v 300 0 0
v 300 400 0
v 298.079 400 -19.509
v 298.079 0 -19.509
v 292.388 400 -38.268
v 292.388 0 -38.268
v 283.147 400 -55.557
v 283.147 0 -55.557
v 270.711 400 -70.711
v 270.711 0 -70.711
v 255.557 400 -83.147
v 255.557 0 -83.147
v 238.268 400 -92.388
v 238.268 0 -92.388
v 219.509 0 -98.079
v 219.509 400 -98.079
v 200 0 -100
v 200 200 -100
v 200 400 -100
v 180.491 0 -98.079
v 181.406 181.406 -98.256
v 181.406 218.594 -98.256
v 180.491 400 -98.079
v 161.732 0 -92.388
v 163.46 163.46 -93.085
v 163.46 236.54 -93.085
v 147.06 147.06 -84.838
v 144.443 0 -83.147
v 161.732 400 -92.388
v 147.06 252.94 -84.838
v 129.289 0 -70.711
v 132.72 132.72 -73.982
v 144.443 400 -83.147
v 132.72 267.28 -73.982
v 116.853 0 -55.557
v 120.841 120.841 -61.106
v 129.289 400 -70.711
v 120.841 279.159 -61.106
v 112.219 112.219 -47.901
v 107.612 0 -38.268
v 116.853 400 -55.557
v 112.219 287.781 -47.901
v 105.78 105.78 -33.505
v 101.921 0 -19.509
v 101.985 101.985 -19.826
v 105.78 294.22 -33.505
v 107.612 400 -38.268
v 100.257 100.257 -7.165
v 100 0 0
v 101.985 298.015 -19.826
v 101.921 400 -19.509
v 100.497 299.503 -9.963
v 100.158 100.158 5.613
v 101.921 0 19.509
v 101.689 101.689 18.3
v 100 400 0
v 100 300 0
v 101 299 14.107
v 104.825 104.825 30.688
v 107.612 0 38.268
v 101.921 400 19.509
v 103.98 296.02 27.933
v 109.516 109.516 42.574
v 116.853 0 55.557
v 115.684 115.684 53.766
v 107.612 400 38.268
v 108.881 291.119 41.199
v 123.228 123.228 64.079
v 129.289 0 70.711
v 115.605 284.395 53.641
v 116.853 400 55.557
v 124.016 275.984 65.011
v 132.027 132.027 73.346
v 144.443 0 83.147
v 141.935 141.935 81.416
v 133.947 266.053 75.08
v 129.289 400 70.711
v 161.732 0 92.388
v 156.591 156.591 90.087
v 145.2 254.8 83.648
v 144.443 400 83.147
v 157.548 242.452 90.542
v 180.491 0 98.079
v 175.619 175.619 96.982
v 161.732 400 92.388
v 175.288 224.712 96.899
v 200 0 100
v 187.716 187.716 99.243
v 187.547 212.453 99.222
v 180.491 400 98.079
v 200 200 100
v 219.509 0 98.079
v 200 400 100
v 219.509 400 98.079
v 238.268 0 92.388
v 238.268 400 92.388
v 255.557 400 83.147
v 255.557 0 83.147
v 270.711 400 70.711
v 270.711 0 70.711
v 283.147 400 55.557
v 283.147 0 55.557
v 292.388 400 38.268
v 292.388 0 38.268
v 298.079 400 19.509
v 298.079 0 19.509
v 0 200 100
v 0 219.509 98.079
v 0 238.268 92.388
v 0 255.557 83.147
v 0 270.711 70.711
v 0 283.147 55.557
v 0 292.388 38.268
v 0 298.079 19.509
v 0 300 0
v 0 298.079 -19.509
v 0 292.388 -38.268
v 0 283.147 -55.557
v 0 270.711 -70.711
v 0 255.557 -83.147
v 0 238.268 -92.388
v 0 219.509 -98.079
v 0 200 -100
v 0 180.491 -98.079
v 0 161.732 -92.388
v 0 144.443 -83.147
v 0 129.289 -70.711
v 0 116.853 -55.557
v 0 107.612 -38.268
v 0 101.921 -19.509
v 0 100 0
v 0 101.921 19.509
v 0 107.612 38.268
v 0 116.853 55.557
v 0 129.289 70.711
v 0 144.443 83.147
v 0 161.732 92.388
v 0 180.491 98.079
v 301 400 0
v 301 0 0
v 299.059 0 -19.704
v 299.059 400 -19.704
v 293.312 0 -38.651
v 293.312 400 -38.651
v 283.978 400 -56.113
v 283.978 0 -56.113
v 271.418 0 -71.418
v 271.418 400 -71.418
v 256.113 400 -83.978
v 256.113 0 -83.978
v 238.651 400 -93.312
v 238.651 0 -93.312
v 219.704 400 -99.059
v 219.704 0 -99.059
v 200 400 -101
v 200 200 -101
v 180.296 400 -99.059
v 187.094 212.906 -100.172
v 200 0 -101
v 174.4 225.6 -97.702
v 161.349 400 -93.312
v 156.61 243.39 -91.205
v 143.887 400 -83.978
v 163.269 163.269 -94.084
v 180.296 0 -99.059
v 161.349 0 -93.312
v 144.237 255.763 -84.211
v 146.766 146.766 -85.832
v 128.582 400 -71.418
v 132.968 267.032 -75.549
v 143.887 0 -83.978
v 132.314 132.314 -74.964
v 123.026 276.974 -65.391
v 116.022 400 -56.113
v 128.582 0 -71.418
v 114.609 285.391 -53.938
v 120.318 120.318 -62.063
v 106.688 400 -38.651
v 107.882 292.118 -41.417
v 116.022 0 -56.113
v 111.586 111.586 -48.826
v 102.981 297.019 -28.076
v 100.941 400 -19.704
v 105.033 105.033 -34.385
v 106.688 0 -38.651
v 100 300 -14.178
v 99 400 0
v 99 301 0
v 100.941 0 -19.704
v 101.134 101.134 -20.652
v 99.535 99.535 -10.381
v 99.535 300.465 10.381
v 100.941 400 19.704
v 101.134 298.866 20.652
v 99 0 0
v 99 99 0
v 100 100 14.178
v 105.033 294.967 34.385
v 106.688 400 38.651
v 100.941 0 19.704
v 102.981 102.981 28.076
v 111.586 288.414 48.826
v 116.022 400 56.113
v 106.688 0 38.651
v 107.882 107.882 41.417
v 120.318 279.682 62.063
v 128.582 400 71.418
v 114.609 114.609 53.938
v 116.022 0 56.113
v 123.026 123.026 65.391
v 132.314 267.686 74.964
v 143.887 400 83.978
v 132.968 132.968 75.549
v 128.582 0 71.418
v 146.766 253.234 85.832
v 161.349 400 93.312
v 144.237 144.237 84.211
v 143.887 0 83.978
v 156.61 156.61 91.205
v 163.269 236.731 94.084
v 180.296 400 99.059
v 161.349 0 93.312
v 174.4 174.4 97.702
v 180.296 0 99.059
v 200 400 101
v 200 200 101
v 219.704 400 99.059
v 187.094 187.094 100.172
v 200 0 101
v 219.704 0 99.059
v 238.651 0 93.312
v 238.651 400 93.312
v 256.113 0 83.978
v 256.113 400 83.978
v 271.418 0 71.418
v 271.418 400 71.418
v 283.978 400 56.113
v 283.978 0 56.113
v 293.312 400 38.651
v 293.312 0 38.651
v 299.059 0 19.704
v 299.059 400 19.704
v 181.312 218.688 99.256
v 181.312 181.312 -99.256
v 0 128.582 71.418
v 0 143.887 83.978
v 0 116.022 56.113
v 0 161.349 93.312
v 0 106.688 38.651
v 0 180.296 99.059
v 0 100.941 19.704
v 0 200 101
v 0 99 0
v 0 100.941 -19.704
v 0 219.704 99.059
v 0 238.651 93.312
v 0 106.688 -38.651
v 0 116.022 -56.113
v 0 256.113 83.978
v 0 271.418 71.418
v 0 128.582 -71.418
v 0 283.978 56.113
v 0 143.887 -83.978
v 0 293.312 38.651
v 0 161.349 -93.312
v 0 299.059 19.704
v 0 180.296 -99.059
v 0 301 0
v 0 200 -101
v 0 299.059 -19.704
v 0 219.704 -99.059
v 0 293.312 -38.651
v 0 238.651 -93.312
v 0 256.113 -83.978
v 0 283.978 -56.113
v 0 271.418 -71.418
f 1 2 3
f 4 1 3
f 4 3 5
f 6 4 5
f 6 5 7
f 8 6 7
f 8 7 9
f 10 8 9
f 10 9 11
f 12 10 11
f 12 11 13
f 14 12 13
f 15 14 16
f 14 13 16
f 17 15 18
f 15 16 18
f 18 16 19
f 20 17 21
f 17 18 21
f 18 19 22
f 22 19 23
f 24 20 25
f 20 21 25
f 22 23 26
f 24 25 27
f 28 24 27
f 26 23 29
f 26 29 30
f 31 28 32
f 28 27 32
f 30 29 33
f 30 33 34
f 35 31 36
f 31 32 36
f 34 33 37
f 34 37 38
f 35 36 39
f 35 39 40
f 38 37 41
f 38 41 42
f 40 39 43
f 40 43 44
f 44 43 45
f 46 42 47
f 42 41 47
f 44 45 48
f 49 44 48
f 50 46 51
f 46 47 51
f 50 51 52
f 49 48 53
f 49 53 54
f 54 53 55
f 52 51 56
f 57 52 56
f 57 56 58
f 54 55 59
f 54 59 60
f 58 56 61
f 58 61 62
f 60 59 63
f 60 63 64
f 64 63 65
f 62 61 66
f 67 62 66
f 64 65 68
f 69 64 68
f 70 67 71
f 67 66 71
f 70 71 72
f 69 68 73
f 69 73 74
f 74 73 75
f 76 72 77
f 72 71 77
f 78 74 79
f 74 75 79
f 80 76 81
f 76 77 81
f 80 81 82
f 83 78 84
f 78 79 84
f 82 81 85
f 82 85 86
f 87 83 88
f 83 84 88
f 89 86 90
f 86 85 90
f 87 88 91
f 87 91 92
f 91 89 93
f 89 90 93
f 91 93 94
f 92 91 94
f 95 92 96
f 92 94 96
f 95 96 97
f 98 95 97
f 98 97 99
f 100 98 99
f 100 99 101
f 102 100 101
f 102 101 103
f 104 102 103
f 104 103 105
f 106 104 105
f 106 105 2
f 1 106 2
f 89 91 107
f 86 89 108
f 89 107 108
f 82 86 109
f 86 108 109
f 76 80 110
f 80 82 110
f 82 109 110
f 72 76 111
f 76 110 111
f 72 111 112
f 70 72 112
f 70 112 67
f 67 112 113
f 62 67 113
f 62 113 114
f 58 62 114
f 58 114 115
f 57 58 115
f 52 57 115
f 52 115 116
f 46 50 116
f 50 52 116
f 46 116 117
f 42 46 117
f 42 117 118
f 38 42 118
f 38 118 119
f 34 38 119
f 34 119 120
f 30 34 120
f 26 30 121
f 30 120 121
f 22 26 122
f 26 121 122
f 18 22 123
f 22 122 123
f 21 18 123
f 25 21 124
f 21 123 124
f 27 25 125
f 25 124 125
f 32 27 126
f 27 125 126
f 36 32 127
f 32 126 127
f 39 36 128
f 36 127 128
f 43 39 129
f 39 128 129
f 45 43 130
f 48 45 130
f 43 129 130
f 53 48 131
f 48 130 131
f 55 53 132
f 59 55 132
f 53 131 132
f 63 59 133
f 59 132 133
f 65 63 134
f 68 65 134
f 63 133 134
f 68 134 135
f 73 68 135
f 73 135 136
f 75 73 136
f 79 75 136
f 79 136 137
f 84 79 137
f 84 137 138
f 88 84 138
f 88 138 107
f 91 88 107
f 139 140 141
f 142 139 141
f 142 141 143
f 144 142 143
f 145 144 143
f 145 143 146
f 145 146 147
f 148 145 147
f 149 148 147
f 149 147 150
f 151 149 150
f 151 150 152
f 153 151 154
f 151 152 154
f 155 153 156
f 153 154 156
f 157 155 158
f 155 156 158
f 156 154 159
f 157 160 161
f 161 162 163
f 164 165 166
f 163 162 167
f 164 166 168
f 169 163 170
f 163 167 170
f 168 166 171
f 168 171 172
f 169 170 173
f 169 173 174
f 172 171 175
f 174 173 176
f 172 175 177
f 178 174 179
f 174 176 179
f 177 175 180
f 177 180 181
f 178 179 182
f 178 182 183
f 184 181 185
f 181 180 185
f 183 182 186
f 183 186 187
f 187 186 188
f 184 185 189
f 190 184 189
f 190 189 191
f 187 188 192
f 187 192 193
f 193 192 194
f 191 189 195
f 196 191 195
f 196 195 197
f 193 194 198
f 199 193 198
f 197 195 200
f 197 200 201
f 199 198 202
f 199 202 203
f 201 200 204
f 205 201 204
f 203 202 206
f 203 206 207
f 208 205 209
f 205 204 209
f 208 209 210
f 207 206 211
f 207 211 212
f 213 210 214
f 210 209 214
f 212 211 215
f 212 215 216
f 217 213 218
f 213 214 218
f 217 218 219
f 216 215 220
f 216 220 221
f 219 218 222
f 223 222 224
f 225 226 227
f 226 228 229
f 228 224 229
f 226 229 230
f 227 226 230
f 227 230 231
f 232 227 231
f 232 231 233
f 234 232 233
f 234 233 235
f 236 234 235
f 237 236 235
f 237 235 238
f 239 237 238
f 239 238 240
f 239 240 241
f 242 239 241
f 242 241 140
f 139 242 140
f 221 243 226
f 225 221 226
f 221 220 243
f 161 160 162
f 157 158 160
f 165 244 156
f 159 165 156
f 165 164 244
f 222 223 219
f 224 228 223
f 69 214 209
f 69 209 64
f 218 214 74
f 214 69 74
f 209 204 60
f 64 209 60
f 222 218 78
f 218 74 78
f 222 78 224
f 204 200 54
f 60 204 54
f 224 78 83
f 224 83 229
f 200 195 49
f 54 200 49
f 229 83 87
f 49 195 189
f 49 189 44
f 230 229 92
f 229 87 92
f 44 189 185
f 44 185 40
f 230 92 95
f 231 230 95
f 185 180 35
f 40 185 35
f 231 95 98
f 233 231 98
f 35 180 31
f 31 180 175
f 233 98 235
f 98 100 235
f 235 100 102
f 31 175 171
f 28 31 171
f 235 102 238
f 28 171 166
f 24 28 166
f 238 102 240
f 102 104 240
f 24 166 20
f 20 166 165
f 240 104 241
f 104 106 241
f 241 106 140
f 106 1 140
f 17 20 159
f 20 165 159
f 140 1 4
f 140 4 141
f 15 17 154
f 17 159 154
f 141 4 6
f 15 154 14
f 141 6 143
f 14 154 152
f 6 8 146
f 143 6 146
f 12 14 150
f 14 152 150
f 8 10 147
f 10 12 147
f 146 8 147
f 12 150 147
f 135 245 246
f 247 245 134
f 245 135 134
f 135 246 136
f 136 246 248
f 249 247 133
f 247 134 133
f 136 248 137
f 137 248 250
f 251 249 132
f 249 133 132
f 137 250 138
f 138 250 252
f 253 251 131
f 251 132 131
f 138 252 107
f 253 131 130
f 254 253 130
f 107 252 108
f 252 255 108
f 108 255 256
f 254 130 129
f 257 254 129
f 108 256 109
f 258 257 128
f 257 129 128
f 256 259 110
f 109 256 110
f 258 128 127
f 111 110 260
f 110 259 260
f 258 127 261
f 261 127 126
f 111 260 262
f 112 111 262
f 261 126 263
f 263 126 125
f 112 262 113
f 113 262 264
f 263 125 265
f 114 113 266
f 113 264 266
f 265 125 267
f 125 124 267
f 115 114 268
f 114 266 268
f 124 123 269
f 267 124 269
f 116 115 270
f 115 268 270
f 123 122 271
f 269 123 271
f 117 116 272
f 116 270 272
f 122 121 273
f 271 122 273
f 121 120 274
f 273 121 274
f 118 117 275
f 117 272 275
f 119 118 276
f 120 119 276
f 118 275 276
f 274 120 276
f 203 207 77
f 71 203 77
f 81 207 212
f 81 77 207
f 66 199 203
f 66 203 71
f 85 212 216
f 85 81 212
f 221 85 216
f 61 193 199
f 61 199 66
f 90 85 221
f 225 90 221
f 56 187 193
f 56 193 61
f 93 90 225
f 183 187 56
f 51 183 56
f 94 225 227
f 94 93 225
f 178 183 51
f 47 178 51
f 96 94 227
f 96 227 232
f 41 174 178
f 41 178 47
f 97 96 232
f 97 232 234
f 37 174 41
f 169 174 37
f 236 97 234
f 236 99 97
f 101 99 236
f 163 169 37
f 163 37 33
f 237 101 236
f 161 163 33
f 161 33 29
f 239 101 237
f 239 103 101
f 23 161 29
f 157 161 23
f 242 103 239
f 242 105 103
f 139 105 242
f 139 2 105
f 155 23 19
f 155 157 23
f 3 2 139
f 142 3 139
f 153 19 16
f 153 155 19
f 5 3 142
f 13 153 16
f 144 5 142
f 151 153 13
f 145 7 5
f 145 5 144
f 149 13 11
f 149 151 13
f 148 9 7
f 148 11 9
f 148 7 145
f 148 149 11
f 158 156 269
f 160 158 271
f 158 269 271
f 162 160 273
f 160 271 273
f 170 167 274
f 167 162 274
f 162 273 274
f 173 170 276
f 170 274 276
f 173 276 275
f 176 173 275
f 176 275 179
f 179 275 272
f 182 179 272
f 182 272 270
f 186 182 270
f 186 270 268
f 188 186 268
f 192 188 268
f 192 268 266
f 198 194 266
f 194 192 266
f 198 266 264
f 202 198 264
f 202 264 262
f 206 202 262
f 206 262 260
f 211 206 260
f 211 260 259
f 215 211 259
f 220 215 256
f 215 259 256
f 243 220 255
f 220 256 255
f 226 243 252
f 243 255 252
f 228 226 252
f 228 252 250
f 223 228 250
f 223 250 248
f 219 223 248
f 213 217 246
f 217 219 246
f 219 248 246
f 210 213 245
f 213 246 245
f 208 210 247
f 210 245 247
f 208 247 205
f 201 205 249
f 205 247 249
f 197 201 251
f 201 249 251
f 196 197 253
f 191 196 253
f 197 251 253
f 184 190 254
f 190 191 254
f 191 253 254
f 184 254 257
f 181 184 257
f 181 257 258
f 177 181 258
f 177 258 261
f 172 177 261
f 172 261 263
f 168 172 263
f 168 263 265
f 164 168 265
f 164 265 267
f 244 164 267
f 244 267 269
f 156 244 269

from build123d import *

# Parameters (mm, degrees)
SKETCH10_R          = 101
BOSS_EXTRUDE5_DEPTH = 200
SKETCH5_R           = 101
BOSS_EXTRUDE6_DEPTH = 400
SKETCH11_R          = 100
CUT_EXTRUDE1_DEPTH  = 400
SKETCH12_R          = 100
CUT_EXTRUDE2_DEPTH  = 200


with BuildPart() as part:
    # Sketch10 → Boss-Extrude5 (new body)
    with BuildSketch(Plane(origin=(0, 0, 0), x_dir=(0, 0, -1), z_dir=(1, 0, 0))):
        with Locations((0, 200)):
            Circle(SKETCH10_R)
    extrude(amount=BOSS_EXTRUDE5_DEPTH)

    # Sketch5 → Boss-Extrude6 (add)
    with BuildSketch(Plane(origin=(0, 0, 0), x_dir=(1, 0, 0), z_dir=(0, 1, 0))):
        with Locations((200, 0)):
            Circle(SKETCH5_R)
    extrude(amount=BOSS_EXTRUDE6_DEPTH)

    # Sketch11 → Cut-Extrude1 (cut)
    with BuildSketch(Plane(origin=(0, 400, 0), x_dir=(1, 0, 0), z_dir=(0, 1, 0))):
        with Locations((200, 0)):
            Circle(SKETCH11_R)
    extrude(amount=-CUT_EXTRUDE1_DEPTH, mode=Mode.SUBTRACT)

    # Sketch12 → Cut-Extrude2 (cut)
    with BuildSketch(Plane.ZY):
        with Locations((0, 200)):
            Circle(SKETCH12_R)
    extrude(amount=-CUT_EXTRUDE2_DEPTH, mode=Mode.SUBTRACT)


solid = part.part
